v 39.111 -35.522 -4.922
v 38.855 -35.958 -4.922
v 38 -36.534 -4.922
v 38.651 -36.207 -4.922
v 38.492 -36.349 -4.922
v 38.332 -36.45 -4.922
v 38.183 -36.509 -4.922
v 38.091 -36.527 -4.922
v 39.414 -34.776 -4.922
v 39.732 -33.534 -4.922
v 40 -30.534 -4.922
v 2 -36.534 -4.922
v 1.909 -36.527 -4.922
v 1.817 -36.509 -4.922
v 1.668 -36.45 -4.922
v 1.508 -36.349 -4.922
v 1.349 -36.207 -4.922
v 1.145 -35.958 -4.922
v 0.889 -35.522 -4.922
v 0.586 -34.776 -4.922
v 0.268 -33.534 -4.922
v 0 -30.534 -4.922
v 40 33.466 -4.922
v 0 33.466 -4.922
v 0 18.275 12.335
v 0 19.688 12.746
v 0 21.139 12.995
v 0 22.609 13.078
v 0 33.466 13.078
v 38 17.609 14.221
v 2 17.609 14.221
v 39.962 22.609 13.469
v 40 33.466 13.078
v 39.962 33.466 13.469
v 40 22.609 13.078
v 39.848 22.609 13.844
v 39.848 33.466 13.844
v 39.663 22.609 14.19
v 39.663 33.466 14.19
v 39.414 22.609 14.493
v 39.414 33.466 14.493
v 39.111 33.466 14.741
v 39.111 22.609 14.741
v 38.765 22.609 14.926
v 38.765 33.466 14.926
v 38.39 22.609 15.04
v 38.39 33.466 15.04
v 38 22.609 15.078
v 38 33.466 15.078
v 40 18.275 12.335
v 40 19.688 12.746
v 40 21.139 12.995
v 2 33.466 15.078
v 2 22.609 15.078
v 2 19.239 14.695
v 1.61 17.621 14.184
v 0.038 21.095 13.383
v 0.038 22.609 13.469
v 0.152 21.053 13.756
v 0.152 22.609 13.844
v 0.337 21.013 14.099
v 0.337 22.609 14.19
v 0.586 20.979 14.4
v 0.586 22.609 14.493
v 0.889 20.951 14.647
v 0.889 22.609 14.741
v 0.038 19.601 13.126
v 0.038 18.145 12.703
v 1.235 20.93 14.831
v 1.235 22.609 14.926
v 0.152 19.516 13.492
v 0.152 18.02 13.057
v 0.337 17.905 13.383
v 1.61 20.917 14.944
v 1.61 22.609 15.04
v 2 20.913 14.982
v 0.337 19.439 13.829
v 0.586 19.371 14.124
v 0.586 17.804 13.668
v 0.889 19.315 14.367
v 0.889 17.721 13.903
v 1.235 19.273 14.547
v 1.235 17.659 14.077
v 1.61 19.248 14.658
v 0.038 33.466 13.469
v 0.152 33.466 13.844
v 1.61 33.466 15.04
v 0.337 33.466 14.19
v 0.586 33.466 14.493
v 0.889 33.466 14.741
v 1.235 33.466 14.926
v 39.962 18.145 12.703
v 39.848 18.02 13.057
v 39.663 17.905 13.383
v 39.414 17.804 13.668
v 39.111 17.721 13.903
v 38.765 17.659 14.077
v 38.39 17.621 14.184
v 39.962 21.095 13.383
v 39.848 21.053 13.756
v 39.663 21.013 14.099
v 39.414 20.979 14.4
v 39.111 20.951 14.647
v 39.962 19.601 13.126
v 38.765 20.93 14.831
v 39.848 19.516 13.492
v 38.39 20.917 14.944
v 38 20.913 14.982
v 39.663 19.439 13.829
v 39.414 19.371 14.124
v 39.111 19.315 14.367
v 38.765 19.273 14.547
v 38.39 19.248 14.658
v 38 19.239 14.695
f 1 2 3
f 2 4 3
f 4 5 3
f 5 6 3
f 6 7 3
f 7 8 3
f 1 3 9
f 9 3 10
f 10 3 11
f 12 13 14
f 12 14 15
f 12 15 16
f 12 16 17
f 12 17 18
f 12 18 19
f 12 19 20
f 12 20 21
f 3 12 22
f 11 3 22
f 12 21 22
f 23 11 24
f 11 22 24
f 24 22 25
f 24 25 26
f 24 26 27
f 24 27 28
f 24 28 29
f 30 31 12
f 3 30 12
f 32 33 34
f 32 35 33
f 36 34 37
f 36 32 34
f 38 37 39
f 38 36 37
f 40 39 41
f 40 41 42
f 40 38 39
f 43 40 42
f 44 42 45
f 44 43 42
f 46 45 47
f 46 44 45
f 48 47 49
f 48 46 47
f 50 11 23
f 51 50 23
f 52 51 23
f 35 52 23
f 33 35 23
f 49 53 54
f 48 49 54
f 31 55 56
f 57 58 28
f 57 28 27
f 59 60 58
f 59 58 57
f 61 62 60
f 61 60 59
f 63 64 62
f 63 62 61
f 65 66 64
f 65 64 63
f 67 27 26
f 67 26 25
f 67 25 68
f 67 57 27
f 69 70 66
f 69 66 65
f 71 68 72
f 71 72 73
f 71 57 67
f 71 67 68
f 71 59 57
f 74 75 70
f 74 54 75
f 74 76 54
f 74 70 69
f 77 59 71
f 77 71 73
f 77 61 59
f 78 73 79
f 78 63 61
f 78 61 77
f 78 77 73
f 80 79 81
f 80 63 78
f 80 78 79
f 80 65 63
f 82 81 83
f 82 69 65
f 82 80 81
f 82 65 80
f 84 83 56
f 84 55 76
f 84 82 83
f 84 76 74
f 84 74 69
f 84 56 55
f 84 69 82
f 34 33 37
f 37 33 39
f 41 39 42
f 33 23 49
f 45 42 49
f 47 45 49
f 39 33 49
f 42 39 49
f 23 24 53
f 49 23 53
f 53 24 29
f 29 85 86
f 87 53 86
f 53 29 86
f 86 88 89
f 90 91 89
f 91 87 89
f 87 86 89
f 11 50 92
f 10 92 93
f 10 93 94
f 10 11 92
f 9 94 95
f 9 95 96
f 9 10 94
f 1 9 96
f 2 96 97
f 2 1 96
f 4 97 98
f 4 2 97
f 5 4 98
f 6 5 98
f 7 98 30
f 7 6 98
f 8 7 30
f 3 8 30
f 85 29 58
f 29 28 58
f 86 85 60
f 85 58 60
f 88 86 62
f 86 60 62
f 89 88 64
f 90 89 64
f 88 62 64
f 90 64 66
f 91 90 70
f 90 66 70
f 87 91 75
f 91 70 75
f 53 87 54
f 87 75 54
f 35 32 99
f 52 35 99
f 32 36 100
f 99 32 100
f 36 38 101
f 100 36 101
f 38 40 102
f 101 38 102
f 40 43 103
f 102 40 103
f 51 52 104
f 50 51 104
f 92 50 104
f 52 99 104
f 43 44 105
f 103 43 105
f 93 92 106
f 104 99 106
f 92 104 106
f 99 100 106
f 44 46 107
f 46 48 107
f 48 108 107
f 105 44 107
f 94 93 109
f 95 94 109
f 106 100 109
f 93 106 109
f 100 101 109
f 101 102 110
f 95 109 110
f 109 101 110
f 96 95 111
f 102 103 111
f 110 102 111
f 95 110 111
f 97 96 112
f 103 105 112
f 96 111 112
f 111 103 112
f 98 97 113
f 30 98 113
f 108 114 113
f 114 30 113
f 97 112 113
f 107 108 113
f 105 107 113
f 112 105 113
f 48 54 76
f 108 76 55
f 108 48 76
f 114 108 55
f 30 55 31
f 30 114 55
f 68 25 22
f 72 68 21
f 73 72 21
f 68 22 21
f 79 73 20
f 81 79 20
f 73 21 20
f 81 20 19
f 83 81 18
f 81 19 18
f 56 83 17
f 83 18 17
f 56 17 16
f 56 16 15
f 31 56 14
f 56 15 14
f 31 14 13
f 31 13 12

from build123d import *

# Parameters (mm, degrees)
F1_DEPTH = 40
F2_R     = 15
F3_R     = 2


with BuildPart() as f1:
    # F0 (on Right) → F1 (new body)
    with BuildSketch(Plane.YZ):
        Polygon((33.466395, 15.078471), (20.034937, 15.078471), (-36.533605, -4.921529), (33.466395, -4.921529), align=None)
    extrude(amount=F1_DEPTH)

    # F2
    f2_edges = [f1.edges().sort_by_distance(p)[0] for p in [
        (20, 20.034937, 15.078471),
    ]]
    fillet(f2_edges, radius=F2_R)

    # F3
    f3_edges = [f1.edges().sort_by_distance(p)[0] for p in [
        (40, -9.462537, 4.649539),
        (0, -9.462537, 4.649539),
    ]]
    fillet(f3_edges, radius=F3_R)


solid = f1.part
